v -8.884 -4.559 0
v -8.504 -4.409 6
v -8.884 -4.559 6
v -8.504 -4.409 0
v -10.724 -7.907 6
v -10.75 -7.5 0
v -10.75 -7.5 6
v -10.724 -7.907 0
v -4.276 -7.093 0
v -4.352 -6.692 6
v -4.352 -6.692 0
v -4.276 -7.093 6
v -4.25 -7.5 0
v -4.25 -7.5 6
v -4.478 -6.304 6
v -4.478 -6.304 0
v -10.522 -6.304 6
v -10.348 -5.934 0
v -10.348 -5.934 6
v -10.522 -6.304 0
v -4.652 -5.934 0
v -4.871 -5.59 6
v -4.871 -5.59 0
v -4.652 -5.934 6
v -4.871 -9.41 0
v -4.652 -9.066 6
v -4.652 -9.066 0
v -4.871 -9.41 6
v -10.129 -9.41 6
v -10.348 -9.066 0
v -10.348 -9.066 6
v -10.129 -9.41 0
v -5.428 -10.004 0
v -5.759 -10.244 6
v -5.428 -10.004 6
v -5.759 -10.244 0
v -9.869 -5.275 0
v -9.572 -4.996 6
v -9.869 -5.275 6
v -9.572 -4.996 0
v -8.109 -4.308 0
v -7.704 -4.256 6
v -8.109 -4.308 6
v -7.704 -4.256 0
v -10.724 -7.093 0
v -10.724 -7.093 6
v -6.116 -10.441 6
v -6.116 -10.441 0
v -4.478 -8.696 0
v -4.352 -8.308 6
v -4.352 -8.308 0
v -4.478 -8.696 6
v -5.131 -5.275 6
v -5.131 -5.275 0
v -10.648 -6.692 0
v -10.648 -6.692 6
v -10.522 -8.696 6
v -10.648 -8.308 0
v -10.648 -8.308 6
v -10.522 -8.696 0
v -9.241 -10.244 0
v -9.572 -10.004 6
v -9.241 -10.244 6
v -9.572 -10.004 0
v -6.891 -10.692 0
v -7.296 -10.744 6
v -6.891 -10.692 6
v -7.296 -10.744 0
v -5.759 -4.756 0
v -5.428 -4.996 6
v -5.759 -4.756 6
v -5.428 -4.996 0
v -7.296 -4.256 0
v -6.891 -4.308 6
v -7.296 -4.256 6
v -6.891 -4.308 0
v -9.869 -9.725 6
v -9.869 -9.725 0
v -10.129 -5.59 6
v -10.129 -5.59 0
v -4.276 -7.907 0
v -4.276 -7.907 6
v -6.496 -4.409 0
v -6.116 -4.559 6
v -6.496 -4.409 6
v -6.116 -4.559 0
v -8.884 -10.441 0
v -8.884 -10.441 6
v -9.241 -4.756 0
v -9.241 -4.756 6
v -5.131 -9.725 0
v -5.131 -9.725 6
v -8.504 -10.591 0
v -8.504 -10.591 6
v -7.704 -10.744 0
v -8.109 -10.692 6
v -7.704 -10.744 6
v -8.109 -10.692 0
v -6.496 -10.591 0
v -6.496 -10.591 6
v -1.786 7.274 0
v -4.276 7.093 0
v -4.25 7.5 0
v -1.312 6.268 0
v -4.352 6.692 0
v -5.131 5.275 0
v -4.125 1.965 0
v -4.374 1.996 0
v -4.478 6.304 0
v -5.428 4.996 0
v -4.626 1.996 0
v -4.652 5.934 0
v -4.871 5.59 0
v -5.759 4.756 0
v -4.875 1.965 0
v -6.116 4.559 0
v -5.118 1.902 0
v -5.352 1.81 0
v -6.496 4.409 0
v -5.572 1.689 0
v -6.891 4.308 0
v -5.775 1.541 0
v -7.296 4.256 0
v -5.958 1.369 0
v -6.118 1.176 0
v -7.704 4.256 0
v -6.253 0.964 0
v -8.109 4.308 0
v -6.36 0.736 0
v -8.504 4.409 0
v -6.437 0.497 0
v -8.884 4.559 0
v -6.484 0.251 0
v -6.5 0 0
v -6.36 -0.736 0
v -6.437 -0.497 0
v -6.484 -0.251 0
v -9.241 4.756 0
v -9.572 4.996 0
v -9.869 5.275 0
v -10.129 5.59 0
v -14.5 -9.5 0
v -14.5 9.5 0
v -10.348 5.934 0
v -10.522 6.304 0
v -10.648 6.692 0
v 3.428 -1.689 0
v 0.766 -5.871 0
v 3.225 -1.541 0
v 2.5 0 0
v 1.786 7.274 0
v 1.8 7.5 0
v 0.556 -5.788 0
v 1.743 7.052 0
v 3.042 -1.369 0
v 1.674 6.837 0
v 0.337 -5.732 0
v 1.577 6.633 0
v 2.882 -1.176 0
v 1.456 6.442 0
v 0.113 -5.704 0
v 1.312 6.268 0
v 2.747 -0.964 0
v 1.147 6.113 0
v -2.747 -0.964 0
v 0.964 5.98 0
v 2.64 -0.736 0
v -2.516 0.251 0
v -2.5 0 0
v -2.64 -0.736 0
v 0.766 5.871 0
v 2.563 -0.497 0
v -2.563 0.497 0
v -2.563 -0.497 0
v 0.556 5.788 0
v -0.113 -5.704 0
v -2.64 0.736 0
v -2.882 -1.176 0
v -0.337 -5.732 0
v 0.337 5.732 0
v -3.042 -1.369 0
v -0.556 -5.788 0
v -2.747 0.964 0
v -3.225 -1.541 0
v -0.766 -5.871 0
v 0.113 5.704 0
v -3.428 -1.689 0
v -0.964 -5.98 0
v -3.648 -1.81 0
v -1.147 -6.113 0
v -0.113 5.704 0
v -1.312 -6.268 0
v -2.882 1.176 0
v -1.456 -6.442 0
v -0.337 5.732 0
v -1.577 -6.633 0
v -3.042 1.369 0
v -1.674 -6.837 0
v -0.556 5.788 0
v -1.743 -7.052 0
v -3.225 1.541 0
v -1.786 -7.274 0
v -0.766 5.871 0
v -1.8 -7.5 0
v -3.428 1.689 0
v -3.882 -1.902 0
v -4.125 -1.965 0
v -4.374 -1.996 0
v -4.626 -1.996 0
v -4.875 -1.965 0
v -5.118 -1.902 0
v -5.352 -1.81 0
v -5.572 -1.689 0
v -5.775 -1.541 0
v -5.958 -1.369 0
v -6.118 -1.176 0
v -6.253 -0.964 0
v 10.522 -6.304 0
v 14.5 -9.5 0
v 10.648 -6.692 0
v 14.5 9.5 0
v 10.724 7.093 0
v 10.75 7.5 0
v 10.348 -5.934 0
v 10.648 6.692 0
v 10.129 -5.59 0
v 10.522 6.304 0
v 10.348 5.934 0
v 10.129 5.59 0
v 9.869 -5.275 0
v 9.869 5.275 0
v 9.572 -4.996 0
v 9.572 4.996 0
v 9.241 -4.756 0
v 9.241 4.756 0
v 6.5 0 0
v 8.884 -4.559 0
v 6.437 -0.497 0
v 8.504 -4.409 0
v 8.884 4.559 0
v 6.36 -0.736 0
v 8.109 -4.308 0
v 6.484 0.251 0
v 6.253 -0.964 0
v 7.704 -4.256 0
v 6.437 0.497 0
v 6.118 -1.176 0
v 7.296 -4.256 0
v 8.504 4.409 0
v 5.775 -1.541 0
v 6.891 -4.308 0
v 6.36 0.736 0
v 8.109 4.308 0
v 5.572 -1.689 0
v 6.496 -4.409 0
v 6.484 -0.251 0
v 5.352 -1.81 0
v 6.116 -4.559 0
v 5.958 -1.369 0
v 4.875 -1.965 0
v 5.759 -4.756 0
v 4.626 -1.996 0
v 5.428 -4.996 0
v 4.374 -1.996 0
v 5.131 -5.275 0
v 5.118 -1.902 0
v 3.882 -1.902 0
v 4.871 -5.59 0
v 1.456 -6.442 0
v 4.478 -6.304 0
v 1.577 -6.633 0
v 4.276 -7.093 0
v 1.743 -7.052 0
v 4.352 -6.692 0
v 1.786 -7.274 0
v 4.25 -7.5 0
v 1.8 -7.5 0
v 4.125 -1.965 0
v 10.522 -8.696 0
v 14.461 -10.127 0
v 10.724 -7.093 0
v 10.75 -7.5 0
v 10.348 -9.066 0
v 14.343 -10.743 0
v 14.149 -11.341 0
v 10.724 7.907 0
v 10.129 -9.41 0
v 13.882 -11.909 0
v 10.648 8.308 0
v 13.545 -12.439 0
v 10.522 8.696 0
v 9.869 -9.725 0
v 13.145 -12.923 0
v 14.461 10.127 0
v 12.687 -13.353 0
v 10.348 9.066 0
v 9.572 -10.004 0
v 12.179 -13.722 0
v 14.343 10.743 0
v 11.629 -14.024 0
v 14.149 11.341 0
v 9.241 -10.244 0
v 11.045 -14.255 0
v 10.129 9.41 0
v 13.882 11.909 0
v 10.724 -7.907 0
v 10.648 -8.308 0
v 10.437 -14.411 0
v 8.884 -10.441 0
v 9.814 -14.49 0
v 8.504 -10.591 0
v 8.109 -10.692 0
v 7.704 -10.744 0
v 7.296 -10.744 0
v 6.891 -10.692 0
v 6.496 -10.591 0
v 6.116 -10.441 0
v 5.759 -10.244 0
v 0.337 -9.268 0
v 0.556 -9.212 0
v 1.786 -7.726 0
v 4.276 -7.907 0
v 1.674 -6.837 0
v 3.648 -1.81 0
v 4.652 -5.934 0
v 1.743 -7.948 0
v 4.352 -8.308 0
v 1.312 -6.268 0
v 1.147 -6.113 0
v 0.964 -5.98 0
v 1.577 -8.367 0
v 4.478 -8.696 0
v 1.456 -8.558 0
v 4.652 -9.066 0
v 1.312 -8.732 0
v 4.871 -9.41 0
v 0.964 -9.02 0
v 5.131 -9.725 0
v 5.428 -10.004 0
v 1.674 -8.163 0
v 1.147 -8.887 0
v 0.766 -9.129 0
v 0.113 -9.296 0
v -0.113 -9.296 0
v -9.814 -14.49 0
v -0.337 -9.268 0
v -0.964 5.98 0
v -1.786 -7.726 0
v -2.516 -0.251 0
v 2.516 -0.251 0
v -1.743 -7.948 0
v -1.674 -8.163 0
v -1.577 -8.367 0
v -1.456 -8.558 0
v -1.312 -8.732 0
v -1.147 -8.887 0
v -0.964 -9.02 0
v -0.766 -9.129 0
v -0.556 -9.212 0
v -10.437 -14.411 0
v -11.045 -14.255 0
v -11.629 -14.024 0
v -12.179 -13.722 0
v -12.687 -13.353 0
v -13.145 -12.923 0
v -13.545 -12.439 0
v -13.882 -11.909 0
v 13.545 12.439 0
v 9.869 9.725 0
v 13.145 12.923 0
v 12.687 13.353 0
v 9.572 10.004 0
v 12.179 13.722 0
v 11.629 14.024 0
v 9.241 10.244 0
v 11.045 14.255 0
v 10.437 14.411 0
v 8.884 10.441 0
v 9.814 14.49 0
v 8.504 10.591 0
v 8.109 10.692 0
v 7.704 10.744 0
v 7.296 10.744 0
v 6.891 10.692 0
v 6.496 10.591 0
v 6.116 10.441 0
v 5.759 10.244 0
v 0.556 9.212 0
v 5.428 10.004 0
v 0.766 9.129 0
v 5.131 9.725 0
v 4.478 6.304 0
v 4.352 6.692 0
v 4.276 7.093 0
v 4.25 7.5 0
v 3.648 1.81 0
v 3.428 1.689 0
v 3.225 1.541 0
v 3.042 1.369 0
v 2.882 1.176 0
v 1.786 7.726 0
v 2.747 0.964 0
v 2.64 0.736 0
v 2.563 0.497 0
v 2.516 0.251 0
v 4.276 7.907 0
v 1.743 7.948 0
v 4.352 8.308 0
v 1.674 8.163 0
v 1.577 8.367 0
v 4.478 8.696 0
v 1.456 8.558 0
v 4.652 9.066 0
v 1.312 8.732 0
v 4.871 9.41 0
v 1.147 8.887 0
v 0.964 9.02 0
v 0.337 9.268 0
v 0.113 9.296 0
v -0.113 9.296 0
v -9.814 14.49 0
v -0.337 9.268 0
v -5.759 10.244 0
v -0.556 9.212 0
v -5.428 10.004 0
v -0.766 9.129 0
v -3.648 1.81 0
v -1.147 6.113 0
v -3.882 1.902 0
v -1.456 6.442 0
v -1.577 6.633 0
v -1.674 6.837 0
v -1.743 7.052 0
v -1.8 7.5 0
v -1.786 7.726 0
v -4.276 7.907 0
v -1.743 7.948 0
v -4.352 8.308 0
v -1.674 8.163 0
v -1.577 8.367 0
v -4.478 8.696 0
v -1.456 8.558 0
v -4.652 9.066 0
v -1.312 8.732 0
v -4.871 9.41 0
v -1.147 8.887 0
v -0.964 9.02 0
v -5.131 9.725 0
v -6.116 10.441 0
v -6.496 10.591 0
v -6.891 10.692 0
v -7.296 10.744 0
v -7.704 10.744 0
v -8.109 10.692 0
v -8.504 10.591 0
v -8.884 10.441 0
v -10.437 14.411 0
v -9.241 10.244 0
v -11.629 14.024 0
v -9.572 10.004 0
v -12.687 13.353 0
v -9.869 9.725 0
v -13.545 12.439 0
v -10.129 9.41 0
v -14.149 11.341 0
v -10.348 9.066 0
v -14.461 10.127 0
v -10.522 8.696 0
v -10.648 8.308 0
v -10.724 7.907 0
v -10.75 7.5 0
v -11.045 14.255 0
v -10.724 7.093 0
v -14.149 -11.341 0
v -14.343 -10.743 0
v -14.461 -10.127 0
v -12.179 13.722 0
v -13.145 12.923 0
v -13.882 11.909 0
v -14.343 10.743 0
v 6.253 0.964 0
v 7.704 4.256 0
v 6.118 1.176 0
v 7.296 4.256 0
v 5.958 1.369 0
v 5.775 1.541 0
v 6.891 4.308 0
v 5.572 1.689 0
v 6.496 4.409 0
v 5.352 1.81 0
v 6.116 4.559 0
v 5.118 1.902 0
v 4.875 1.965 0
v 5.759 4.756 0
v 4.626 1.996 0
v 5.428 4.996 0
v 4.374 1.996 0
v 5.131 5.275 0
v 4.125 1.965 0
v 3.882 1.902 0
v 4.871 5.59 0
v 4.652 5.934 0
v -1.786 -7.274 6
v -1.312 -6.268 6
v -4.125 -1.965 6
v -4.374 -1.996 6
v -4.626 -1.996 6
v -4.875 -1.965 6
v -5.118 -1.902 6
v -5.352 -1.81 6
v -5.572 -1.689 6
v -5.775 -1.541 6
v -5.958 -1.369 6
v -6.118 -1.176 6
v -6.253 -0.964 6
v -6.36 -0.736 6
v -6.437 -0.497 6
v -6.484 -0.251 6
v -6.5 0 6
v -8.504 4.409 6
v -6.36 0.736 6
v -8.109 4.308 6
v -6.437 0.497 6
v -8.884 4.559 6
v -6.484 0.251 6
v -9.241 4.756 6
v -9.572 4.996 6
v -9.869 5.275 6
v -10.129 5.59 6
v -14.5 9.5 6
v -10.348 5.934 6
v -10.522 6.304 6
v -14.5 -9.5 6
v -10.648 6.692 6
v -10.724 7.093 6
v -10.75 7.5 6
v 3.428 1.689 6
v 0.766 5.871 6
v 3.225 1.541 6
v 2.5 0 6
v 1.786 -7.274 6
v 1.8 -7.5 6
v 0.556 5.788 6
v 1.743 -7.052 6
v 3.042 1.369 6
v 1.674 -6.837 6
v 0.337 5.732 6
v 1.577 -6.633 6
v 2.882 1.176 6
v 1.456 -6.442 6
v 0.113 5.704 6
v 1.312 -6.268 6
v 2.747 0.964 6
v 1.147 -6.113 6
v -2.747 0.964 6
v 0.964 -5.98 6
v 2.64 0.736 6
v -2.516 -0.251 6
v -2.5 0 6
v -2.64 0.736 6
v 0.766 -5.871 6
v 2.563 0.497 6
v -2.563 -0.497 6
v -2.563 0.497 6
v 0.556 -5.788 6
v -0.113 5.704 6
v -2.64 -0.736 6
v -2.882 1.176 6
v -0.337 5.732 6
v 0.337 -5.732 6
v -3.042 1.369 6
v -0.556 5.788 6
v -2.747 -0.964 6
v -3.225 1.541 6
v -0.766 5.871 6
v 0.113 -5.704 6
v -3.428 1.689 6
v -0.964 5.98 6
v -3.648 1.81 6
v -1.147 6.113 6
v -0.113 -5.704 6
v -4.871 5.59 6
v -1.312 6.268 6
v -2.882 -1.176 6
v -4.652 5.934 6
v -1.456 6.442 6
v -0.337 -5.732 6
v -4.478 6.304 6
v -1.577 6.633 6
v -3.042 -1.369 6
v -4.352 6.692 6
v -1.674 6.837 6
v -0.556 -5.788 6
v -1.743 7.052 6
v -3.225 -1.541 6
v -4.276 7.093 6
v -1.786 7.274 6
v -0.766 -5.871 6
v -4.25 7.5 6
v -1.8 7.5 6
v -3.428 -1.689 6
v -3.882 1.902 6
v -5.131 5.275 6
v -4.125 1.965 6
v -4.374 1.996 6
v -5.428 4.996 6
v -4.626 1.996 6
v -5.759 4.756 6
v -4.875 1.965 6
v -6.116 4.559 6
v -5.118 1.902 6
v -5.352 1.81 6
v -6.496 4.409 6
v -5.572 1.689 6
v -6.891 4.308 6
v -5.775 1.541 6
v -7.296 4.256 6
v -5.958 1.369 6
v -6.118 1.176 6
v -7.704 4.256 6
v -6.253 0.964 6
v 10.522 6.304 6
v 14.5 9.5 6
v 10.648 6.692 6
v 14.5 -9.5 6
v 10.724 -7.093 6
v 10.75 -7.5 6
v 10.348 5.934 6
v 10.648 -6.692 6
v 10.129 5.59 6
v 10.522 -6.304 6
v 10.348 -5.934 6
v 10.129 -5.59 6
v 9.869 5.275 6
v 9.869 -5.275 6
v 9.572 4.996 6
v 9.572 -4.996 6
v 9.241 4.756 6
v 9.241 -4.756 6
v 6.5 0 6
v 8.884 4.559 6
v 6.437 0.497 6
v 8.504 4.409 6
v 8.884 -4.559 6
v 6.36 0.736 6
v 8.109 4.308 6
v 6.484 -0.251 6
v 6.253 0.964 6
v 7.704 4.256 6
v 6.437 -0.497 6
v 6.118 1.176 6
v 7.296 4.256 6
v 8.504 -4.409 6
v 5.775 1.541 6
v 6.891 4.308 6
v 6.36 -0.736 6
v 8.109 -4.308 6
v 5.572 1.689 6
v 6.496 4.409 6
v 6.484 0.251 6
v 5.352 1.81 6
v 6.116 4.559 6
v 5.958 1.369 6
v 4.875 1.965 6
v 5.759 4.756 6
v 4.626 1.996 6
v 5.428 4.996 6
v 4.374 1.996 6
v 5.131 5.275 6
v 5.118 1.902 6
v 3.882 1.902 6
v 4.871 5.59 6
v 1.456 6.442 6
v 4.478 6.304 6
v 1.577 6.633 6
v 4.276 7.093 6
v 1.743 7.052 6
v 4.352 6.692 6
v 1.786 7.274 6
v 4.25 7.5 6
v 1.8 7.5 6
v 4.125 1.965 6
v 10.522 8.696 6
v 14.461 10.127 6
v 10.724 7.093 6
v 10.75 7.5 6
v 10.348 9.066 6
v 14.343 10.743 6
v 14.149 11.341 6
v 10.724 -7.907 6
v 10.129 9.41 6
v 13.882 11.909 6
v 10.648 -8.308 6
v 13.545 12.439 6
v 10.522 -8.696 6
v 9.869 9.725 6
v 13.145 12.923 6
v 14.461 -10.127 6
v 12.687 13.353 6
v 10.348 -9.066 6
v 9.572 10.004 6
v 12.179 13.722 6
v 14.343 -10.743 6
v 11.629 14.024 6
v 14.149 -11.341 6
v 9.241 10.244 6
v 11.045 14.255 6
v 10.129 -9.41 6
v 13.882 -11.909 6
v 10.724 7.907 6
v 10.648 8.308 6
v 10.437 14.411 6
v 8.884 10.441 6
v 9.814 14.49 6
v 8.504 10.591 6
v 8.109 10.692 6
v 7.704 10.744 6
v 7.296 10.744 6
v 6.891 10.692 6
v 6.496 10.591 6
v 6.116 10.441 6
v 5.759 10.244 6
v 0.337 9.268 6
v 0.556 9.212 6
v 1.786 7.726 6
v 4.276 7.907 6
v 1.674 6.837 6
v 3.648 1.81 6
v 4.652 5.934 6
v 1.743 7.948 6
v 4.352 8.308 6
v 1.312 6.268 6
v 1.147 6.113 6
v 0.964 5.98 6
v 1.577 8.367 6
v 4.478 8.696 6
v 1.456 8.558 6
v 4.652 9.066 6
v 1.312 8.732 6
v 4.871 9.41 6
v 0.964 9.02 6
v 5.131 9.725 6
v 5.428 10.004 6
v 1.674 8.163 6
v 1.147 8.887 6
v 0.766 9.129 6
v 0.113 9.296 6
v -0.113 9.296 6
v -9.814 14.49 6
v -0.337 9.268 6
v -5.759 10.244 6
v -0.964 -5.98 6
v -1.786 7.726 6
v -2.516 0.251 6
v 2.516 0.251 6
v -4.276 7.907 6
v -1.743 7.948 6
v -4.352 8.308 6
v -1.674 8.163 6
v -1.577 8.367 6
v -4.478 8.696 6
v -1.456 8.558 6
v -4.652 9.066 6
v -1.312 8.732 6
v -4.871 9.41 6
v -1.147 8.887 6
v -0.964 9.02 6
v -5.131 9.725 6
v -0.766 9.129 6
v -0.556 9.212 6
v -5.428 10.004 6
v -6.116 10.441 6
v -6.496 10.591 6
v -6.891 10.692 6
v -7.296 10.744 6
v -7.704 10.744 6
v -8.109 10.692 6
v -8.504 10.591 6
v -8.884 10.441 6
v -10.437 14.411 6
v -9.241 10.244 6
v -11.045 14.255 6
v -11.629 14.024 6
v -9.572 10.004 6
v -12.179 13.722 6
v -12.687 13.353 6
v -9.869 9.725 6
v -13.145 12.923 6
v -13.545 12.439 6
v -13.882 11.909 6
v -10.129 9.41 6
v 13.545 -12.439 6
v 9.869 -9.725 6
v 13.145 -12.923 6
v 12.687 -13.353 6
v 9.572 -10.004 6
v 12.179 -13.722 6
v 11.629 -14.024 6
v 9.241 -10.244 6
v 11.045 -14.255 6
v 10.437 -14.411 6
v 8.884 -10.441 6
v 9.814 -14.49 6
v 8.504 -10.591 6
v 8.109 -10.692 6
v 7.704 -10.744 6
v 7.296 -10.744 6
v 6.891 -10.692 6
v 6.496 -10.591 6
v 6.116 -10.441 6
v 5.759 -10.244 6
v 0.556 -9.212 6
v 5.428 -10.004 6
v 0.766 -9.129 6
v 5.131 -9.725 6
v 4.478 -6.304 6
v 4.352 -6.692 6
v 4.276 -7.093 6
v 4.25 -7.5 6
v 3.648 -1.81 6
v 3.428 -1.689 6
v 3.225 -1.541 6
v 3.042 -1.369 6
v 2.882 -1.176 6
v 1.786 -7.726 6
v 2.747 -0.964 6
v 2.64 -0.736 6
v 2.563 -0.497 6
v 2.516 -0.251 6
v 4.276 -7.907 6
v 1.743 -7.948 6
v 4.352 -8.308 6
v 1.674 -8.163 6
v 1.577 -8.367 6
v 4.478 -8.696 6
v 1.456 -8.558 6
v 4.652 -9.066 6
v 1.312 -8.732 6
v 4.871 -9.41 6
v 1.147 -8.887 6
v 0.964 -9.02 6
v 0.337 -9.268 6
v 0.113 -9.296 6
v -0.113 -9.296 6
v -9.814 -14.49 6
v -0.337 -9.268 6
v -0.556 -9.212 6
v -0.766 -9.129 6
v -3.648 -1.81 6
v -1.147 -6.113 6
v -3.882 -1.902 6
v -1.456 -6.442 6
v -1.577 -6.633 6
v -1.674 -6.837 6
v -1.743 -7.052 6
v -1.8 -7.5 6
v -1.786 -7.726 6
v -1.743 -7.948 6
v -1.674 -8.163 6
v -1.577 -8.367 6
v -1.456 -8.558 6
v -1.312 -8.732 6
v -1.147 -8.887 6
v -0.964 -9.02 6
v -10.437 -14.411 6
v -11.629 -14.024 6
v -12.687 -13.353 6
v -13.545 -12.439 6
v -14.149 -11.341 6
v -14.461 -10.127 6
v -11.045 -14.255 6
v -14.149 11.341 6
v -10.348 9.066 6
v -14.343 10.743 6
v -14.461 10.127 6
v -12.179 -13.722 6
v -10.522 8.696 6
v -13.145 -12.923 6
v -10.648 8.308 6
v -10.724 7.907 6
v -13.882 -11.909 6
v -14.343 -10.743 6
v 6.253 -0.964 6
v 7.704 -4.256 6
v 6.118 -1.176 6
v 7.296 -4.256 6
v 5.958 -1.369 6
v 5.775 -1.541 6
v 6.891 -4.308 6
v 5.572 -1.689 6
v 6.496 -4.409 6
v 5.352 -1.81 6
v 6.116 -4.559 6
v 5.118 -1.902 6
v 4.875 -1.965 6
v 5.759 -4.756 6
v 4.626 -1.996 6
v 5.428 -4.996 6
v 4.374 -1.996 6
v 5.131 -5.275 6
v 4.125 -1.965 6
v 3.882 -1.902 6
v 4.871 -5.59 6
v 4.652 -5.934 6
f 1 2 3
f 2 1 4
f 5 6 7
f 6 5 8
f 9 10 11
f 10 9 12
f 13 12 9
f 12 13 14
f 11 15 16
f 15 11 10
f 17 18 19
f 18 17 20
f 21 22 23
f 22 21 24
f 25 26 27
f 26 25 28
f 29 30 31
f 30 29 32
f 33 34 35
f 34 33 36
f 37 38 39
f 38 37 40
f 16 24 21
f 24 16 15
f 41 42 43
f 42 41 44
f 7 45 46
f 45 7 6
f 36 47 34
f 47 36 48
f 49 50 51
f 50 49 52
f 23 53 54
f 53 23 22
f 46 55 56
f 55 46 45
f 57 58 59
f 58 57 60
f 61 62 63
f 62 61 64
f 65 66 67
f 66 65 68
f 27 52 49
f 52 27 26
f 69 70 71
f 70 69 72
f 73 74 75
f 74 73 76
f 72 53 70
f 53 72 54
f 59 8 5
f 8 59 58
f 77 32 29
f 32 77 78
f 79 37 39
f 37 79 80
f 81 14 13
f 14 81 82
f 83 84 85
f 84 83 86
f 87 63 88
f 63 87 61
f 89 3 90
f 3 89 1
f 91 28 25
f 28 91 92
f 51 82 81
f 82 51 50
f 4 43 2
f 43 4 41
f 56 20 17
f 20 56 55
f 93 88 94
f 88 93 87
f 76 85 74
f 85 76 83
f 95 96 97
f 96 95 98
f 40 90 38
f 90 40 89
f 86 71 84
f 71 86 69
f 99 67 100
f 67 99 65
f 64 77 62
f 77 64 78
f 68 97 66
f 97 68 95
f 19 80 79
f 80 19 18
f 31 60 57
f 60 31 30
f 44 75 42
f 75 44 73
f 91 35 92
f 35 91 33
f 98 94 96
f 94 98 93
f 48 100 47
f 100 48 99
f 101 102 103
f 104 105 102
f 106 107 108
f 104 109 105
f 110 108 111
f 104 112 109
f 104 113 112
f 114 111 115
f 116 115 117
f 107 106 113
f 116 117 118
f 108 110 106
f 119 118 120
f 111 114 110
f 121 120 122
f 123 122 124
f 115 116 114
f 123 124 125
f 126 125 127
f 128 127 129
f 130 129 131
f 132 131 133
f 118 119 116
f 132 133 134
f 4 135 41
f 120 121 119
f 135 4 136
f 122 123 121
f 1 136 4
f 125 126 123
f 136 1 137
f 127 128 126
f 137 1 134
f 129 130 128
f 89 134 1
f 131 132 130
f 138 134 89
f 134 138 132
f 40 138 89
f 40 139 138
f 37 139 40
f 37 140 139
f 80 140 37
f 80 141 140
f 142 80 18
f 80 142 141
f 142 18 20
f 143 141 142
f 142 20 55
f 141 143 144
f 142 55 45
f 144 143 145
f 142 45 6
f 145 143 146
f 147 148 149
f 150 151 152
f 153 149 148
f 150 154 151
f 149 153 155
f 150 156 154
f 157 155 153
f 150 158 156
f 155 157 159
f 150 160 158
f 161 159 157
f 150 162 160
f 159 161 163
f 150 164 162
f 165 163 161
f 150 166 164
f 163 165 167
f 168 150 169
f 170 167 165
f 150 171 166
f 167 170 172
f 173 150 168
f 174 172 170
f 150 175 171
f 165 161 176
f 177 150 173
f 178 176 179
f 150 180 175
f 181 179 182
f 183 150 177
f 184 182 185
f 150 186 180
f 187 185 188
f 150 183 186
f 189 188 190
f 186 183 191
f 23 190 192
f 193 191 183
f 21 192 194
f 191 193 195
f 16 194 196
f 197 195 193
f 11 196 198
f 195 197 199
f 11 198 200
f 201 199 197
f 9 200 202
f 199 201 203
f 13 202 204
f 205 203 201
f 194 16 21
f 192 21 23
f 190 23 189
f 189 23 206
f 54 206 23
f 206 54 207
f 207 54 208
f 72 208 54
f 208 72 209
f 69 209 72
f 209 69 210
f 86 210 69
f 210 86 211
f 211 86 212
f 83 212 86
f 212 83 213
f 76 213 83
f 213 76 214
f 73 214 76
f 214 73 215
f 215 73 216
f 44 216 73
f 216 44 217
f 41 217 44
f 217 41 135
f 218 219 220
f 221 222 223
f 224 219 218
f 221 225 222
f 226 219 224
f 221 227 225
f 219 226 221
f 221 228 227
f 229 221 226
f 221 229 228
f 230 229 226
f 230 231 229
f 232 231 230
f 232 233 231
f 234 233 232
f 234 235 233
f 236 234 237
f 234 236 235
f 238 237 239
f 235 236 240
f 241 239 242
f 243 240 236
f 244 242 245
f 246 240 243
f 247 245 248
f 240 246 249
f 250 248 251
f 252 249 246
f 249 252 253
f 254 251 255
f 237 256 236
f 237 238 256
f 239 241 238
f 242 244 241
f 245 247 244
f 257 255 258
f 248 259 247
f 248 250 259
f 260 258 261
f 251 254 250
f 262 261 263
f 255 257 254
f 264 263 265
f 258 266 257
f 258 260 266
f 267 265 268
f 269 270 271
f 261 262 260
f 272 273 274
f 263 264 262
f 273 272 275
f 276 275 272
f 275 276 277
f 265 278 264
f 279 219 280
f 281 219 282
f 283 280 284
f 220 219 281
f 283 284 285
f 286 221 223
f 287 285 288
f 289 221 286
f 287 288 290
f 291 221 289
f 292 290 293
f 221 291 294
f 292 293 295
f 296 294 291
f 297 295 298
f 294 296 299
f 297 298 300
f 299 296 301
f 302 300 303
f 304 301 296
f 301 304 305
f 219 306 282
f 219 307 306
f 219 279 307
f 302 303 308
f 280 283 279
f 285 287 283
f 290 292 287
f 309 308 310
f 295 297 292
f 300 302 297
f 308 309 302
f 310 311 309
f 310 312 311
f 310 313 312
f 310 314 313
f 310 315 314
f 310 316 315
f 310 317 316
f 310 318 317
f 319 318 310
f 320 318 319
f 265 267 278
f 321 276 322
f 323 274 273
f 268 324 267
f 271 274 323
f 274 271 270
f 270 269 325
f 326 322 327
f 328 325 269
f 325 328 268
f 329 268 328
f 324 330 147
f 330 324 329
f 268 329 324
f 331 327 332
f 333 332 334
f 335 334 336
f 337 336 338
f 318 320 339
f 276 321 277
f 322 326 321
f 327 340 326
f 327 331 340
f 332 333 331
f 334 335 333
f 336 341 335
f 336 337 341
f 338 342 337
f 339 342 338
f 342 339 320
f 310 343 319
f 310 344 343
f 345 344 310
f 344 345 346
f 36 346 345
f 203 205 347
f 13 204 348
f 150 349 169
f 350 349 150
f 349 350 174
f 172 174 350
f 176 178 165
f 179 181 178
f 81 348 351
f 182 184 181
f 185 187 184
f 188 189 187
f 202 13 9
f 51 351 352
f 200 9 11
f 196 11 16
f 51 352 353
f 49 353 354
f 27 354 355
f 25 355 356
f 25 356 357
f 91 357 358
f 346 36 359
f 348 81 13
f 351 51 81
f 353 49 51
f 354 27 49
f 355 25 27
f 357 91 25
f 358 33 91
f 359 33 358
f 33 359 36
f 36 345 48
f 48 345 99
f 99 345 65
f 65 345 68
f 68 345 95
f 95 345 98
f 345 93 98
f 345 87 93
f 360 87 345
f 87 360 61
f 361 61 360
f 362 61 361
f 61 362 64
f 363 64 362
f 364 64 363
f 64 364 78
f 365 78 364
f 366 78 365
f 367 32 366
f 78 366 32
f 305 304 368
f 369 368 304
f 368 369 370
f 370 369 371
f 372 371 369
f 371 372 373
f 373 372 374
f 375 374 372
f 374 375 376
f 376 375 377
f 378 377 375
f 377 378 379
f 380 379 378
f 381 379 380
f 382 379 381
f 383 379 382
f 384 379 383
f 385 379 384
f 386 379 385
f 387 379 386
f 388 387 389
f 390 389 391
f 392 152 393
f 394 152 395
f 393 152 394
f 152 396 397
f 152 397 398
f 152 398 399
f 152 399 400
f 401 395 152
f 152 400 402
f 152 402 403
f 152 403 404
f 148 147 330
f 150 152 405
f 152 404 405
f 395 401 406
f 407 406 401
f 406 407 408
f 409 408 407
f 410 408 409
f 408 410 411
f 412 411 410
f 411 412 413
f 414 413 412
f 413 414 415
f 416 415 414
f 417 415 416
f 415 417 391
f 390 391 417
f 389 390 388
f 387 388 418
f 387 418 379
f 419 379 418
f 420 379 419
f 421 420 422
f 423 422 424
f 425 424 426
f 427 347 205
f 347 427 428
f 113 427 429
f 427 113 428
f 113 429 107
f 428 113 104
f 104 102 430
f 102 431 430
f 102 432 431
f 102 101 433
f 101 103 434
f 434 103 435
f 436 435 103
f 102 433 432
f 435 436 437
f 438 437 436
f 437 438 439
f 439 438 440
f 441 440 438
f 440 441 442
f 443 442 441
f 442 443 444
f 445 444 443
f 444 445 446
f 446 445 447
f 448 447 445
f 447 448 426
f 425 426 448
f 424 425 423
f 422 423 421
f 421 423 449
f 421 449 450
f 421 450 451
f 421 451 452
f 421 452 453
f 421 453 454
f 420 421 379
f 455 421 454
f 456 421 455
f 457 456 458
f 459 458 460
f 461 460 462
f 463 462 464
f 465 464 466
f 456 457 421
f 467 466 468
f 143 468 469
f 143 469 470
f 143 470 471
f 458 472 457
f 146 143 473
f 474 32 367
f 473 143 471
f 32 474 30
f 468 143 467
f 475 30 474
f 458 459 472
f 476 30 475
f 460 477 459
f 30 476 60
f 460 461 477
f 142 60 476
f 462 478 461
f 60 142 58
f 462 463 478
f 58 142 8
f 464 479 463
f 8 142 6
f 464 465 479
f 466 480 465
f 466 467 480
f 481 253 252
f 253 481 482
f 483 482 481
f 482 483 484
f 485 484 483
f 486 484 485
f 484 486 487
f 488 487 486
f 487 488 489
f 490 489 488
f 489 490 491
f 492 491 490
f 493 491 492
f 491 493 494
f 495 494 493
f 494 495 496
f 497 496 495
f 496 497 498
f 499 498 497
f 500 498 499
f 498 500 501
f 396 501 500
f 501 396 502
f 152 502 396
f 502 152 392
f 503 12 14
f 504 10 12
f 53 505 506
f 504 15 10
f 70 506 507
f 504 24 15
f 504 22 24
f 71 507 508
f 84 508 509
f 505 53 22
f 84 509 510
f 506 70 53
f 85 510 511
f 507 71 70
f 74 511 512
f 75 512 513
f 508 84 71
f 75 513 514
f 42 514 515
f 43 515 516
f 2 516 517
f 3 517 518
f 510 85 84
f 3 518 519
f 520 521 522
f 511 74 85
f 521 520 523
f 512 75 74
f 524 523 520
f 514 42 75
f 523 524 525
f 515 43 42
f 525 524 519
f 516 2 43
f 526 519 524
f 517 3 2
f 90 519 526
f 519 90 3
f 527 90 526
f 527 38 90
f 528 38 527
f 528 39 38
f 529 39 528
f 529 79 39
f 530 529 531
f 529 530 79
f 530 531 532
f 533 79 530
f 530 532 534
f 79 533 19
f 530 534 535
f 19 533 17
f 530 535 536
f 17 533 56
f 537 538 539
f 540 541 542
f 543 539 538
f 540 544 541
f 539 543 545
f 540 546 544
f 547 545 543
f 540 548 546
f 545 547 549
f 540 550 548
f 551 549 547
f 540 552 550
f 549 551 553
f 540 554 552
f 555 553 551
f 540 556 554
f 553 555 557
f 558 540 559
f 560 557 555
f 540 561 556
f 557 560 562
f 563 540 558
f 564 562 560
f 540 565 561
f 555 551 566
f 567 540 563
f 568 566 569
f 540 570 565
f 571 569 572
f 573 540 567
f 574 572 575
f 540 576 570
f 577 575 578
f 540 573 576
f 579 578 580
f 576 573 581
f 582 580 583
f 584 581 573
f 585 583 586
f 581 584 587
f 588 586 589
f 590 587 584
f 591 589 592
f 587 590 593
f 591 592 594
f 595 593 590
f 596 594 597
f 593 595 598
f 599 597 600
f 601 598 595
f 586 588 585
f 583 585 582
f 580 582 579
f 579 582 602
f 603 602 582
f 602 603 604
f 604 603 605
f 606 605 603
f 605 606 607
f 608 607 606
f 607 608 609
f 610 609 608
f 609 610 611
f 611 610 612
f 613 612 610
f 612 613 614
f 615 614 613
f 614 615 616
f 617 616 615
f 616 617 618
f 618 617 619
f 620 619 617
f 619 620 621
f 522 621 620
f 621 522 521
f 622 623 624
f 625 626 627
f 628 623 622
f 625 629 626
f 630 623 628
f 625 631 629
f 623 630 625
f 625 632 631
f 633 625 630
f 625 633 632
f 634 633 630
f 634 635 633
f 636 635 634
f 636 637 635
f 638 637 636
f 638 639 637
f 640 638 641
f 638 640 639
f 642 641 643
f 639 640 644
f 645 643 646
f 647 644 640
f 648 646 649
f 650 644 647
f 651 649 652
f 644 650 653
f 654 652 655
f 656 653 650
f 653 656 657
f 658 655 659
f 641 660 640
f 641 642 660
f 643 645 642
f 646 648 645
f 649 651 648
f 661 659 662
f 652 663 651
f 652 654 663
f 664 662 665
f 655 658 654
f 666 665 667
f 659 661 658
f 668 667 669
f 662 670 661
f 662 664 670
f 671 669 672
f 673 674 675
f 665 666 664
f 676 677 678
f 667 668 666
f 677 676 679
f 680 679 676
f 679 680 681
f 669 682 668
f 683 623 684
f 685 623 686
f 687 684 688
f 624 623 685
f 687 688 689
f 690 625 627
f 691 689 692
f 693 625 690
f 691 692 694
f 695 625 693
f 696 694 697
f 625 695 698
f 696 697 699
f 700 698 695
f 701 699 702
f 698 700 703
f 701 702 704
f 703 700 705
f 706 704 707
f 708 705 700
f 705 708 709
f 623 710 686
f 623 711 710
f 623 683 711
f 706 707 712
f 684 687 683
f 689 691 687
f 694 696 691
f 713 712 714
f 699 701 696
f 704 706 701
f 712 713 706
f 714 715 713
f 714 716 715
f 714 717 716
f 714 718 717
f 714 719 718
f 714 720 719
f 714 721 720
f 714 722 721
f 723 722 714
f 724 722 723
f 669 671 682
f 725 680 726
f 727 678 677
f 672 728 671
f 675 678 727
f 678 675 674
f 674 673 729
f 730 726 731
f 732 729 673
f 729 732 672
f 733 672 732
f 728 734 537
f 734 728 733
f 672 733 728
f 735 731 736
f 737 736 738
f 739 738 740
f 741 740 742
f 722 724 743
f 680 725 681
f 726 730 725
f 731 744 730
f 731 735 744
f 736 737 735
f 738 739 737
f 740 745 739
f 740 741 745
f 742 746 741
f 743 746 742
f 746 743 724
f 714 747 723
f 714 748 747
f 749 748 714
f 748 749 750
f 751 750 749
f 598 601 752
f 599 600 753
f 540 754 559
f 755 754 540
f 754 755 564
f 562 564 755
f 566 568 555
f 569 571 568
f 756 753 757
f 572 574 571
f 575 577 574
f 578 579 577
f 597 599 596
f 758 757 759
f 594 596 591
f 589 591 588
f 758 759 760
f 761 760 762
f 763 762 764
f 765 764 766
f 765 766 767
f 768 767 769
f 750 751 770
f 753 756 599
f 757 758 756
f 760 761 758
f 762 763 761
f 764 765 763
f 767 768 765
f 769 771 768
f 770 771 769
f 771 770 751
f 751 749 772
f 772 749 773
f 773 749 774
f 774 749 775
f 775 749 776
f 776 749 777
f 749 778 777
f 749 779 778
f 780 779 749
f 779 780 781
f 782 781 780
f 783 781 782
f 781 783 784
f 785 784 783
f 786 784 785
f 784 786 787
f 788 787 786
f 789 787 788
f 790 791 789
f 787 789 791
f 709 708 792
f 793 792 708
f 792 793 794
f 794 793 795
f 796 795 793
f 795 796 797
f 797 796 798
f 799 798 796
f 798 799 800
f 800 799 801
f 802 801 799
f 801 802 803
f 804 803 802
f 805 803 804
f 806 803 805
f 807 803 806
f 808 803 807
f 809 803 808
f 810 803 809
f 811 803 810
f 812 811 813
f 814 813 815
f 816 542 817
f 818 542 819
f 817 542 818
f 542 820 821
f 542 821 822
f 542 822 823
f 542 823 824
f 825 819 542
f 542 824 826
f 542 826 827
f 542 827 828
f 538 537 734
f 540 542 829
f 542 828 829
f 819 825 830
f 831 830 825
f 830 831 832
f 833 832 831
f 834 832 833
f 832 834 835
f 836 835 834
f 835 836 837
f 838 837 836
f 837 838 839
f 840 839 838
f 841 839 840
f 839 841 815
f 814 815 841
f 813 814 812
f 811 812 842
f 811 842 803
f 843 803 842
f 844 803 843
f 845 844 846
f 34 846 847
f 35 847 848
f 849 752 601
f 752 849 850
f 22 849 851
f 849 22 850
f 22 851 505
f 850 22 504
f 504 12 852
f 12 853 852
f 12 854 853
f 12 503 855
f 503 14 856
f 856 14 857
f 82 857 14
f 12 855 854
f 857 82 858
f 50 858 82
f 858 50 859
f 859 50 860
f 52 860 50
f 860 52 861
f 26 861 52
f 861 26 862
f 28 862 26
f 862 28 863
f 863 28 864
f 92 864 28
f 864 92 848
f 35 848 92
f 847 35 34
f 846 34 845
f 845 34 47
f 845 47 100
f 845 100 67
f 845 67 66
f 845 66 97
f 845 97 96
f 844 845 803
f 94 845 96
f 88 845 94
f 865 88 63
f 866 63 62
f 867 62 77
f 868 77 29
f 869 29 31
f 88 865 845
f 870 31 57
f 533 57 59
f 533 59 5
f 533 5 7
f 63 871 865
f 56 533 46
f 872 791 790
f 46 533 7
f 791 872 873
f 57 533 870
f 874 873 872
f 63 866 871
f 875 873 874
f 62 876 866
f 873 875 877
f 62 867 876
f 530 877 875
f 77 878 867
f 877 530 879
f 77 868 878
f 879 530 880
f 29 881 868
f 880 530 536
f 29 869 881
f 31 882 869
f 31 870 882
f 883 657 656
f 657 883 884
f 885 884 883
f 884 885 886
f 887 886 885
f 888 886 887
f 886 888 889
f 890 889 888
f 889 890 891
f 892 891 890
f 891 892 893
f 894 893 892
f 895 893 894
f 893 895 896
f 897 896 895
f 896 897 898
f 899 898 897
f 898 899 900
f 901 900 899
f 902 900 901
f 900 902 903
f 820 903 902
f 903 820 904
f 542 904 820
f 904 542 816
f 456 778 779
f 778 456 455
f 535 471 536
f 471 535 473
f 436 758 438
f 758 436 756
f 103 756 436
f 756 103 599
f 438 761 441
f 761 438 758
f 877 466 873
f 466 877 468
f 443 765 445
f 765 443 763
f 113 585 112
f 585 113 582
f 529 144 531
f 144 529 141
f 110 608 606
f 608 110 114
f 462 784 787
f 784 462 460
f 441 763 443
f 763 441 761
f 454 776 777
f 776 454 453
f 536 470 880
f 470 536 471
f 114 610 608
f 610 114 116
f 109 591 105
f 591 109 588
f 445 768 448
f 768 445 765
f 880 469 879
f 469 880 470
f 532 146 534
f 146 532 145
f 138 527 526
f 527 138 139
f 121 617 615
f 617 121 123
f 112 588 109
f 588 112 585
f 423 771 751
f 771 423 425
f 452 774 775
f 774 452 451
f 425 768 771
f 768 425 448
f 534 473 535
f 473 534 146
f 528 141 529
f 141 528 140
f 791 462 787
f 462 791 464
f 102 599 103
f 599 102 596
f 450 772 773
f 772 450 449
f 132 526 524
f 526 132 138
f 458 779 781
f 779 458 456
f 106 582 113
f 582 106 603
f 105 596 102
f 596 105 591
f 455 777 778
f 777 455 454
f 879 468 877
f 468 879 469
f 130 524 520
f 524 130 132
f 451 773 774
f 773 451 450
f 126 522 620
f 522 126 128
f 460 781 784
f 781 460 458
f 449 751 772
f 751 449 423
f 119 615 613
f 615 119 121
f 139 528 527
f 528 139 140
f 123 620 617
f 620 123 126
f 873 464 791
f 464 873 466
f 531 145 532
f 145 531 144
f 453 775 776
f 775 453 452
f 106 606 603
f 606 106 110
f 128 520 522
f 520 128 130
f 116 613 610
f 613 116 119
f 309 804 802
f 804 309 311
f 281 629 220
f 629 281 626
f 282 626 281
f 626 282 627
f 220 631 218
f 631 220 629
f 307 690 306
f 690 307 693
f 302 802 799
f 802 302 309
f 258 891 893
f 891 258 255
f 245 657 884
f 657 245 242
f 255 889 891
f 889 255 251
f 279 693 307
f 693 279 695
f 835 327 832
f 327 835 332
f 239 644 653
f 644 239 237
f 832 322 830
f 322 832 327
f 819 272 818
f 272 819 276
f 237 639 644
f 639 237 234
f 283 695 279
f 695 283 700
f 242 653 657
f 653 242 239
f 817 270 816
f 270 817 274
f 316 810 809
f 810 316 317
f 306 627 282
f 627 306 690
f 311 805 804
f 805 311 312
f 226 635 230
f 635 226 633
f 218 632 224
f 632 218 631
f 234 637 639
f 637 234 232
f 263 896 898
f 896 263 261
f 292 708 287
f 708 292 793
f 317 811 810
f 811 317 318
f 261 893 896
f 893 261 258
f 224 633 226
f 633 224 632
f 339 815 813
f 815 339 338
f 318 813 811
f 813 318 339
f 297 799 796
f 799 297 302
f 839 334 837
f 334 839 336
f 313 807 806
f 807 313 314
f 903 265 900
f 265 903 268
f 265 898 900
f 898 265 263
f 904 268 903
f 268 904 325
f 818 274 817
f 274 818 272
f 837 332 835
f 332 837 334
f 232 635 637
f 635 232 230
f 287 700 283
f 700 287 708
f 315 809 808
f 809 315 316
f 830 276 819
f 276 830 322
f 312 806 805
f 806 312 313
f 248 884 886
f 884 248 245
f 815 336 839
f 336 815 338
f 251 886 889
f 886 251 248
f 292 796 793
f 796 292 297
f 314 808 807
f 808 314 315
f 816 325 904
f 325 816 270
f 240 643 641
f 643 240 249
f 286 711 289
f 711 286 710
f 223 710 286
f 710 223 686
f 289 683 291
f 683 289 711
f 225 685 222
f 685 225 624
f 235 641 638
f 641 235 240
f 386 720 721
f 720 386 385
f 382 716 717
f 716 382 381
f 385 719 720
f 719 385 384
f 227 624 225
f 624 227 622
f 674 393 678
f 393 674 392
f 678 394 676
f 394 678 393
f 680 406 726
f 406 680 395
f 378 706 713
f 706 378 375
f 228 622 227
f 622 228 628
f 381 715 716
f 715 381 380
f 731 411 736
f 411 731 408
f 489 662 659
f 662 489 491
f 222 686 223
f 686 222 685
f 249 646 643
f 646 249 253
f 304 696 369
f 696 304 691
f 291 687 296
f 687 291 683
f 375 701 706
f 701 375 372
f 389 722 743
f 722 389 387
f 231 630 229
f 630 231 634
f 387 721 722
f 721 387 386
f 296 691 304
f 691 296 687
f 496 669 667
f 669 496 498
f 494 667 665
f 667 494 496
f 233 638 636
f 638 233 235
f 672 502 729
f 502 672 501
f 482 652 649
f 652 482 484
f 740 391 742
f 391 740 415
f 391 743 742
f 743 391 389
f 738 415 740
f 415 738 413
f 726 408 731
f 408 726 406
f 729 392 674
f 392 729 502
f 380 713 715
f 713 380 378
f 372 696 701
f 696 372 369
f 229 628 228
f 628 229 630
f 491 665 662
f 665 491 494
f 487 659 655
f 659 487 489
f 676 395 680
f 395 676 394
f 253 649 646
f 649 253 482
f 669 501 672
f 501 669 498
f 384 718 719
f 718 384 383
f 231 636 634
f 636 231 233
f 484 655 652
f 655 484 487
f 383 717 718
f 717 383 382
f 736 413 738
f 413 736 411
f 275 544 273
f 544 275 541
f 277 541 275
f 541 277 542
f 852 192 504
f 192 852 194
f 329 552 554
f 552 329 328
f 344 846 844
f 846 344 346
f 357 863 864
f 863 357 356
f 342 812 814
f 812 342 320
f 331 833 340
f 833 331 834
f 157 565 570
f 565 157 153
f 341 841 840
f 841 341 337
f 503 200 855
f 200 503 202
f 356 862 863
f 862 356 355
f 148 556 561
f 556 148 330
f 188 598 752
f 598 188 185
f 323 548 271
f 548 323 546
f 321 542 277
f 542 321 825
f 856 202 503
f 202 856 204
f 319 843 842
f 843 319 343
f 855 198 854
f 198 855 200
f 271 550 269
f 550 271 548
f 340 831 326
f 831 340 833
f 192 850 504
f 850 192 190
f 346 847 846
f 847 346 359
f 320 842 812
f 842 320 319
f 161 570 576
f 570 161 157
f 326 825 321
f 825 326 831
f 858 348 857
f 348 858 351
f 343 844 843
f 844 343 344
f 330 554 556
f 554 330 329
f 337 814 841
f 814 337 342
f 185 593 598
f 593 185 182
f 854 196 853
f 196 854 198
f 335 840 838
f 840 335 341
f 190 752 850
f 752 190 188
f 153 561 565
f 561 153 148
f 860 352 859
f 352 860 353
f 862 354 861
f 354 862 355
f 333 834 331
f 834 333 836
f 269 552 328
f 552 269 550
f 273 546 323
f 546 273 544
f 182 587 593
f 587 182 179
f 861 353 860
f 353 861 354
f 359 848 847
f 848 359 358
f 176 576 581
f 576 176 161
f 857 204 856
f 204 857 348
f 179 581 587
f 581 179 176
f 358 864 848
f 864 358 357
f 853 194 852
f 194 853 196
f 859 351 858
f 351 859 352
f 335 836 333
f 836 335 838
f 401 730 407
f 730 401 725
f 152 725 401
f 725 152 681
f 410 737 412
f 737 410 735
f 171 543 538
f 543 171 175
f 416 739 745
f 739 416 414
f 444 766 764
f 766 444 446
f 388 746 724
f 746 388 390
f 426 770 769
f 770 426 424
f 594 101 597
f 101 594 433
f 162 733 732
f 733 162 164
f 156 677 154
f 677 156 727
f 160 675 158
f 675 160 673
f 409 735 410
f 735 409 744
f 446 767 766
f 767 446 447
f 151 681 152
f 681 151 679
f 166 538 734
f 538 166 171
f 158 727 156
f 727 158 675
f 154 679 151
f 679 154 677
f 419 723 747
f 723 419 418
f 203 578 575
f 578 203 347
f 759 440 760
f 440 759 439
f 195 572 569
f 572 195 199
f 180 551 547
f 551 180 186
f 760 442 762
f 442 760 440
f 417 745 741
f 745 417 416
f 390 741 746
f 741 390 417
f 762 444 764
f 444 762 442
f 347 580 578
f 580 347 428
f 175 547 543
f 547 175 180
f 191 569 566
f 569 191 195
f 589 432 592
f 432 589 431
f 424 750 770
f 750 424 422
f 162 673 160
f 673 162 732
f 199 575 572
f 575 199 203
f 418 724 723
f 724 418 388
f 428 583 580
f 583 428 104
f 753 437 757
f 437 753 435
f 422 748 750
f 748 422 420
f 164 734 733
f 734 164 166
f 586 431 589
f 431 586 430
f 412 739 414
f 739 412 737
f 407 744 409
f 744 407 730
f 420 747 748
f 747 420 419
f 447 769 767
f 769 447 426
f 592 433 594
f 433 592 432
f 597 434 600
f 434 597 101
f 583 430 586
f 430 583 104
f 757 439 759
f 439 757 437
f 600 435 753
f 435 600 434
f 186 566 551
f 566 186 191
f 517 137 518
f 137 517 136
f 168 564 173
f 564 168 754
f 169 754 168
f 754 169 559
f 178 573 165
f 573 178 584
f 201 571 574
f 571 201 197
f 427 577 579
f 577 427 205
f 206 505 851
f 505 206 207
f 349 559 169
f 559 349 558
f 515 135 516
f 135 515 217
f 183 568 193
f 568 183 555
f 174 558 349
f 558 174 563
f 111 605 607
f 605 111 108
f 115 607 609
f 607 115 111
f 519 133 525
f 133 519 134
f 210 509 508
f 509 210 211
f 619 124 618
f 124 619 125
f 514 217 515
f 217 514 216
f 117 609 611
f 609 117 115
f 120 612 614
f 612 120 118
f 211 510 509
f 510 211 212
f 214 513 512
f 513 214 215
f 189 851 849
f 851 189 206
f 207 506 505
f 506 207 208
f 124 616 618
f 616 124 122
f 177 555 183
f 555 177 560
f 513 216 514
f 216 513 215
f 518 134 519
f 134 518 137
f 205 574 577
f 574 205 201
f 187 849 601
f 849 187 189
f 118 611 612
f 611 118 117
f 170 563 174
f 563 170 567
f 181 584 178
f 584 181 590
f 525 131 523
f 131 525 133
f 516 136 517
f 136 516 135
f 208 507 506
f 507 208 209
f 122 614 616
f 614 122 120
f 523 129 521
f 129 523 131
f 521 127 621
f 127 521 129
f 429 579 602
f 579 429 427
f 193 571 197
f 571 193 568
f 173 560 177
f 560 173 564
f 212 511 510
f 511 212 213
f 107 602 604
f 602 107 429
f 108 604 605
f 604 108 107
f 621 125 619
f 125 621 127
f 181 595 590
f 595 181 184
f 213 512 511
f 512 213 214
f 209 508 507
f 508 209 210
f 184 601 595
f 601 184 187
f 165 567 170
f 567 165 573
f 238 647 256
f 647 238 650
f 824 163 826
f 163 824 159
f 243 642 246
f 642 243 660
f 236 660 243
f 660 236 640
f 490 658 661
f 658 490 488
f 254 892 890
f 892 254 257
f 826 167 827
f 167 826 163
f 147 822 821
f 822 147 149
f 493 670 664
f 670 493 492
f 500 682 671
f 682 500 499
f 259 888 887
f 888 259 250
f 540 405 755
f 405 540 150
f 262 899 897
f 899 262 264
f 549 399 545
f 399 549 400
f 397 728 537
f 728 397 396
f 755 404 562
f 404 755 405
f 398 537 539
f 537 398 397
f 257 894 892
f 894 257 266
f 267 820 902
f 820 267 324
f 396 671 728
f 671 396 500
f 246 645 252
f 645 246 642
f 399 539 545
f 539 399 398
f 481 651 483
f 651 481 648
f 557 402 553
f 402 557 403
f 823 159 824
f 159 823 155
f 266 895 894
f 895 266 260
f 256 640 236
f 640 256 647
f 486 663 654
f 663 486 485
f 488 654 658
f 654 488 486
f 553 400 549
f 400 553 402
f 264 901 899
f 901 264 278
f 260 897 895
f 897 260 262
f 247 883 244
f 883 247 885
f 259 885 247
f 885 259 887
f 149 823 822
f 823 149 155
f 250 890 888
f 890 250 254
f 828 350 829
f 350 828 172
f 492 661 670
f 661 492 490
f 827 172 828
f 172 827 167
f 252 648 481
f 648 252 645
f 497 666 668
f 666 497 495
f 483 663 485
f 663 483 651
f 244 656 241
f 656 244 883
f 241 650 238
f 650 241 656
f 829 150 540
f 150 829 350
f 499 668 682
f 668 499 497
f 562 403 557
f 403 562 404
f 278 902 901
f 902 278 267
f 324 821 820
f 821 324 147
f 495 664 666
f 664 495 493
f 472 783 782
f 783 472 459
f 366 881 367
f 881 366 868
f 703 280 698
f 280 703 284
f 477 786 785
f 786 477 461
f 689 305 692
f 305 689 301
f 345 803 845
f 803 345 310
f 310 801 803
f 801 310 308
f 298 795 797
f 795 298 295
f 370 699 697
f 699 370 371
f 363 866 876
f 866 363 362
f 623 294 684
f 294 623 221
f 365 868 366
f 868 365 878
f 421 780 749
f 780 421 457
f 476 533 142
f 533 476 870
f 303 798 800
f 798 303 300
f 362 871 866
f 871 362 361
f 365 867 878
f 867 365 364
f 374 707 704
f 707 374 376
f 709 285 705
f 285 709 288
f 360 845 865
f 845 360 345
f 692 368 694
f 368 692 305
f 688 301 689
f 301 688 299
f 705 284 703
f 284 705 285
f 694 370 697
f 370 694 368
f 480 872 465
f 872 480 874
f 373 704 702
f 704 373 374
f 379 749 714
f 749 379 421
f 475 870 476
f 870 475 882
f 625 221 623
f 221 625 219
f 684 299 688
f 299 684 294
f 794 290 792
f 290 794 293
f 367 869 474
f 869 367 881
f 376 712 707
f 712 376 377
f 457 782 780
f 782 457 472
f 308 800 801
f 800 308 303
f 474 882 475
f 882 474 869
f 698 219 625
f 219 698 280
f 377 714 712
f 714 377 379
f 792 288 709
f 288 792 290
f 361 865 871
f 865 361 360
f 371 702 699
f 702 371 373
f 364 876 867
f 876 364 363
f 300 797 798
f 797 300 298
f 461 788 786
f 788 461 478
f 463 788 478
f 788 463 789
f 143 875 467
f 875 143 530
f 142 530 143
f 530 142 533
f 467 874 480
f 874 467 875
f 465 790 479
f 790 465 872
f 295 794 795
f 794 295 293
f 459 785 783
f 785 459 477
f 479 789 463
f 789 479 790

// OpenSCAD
$fn = 50;

difference() {
	union() {
		hull() {
			translate(v = [-9.5, 9.5, 0]) {
				cylinder(h = 6, r = 5);
			}
			translate(v = [9.5, 9.5, 0]) {
				cylinder(h = 6, r = 5);
			}
			translate(v = [-9.5, -9.5, 0]) {
				cylinder(h = 6, r = 5);
			}
			translate(v = [9.5, -9.5, 0]) {
				cylinder(h = 6, r = 5);
			}
		}
	}
	union() {
		translate(v = [-7.5, -7.5, 0]) {
			cylinder(h = 6, r = 3.25);
		}
		translate(v = [-7.5, 7.5, 0]) {
			cylinder(h = 6, r = 3.25);
		}
		translate(v = [7.5, -7.5, 0]) {
			cylinder(h = 6, r = 3.25);
		}
		translate(v = [7.5, 7.5, 0]) {
			cylinder(h = 6, r = 3.25);
		}
		translate(v = [0.0, -7.5, 0]) {
			cylinder(h = 6, r = 1.8);
		}
		translate(v = [0.0, 7.5, 0]) {
			cylinder(h = 6, r = 1.8);
		}
		translate(v = [-4.5, 0, 0.0]) {
			cylinder(h = 6, r = 2.0);
		}
		translate(v = [4.5, 0, 0.0]) {
			cylinder(h = 6, r = 2.0);
		}
	}
}
